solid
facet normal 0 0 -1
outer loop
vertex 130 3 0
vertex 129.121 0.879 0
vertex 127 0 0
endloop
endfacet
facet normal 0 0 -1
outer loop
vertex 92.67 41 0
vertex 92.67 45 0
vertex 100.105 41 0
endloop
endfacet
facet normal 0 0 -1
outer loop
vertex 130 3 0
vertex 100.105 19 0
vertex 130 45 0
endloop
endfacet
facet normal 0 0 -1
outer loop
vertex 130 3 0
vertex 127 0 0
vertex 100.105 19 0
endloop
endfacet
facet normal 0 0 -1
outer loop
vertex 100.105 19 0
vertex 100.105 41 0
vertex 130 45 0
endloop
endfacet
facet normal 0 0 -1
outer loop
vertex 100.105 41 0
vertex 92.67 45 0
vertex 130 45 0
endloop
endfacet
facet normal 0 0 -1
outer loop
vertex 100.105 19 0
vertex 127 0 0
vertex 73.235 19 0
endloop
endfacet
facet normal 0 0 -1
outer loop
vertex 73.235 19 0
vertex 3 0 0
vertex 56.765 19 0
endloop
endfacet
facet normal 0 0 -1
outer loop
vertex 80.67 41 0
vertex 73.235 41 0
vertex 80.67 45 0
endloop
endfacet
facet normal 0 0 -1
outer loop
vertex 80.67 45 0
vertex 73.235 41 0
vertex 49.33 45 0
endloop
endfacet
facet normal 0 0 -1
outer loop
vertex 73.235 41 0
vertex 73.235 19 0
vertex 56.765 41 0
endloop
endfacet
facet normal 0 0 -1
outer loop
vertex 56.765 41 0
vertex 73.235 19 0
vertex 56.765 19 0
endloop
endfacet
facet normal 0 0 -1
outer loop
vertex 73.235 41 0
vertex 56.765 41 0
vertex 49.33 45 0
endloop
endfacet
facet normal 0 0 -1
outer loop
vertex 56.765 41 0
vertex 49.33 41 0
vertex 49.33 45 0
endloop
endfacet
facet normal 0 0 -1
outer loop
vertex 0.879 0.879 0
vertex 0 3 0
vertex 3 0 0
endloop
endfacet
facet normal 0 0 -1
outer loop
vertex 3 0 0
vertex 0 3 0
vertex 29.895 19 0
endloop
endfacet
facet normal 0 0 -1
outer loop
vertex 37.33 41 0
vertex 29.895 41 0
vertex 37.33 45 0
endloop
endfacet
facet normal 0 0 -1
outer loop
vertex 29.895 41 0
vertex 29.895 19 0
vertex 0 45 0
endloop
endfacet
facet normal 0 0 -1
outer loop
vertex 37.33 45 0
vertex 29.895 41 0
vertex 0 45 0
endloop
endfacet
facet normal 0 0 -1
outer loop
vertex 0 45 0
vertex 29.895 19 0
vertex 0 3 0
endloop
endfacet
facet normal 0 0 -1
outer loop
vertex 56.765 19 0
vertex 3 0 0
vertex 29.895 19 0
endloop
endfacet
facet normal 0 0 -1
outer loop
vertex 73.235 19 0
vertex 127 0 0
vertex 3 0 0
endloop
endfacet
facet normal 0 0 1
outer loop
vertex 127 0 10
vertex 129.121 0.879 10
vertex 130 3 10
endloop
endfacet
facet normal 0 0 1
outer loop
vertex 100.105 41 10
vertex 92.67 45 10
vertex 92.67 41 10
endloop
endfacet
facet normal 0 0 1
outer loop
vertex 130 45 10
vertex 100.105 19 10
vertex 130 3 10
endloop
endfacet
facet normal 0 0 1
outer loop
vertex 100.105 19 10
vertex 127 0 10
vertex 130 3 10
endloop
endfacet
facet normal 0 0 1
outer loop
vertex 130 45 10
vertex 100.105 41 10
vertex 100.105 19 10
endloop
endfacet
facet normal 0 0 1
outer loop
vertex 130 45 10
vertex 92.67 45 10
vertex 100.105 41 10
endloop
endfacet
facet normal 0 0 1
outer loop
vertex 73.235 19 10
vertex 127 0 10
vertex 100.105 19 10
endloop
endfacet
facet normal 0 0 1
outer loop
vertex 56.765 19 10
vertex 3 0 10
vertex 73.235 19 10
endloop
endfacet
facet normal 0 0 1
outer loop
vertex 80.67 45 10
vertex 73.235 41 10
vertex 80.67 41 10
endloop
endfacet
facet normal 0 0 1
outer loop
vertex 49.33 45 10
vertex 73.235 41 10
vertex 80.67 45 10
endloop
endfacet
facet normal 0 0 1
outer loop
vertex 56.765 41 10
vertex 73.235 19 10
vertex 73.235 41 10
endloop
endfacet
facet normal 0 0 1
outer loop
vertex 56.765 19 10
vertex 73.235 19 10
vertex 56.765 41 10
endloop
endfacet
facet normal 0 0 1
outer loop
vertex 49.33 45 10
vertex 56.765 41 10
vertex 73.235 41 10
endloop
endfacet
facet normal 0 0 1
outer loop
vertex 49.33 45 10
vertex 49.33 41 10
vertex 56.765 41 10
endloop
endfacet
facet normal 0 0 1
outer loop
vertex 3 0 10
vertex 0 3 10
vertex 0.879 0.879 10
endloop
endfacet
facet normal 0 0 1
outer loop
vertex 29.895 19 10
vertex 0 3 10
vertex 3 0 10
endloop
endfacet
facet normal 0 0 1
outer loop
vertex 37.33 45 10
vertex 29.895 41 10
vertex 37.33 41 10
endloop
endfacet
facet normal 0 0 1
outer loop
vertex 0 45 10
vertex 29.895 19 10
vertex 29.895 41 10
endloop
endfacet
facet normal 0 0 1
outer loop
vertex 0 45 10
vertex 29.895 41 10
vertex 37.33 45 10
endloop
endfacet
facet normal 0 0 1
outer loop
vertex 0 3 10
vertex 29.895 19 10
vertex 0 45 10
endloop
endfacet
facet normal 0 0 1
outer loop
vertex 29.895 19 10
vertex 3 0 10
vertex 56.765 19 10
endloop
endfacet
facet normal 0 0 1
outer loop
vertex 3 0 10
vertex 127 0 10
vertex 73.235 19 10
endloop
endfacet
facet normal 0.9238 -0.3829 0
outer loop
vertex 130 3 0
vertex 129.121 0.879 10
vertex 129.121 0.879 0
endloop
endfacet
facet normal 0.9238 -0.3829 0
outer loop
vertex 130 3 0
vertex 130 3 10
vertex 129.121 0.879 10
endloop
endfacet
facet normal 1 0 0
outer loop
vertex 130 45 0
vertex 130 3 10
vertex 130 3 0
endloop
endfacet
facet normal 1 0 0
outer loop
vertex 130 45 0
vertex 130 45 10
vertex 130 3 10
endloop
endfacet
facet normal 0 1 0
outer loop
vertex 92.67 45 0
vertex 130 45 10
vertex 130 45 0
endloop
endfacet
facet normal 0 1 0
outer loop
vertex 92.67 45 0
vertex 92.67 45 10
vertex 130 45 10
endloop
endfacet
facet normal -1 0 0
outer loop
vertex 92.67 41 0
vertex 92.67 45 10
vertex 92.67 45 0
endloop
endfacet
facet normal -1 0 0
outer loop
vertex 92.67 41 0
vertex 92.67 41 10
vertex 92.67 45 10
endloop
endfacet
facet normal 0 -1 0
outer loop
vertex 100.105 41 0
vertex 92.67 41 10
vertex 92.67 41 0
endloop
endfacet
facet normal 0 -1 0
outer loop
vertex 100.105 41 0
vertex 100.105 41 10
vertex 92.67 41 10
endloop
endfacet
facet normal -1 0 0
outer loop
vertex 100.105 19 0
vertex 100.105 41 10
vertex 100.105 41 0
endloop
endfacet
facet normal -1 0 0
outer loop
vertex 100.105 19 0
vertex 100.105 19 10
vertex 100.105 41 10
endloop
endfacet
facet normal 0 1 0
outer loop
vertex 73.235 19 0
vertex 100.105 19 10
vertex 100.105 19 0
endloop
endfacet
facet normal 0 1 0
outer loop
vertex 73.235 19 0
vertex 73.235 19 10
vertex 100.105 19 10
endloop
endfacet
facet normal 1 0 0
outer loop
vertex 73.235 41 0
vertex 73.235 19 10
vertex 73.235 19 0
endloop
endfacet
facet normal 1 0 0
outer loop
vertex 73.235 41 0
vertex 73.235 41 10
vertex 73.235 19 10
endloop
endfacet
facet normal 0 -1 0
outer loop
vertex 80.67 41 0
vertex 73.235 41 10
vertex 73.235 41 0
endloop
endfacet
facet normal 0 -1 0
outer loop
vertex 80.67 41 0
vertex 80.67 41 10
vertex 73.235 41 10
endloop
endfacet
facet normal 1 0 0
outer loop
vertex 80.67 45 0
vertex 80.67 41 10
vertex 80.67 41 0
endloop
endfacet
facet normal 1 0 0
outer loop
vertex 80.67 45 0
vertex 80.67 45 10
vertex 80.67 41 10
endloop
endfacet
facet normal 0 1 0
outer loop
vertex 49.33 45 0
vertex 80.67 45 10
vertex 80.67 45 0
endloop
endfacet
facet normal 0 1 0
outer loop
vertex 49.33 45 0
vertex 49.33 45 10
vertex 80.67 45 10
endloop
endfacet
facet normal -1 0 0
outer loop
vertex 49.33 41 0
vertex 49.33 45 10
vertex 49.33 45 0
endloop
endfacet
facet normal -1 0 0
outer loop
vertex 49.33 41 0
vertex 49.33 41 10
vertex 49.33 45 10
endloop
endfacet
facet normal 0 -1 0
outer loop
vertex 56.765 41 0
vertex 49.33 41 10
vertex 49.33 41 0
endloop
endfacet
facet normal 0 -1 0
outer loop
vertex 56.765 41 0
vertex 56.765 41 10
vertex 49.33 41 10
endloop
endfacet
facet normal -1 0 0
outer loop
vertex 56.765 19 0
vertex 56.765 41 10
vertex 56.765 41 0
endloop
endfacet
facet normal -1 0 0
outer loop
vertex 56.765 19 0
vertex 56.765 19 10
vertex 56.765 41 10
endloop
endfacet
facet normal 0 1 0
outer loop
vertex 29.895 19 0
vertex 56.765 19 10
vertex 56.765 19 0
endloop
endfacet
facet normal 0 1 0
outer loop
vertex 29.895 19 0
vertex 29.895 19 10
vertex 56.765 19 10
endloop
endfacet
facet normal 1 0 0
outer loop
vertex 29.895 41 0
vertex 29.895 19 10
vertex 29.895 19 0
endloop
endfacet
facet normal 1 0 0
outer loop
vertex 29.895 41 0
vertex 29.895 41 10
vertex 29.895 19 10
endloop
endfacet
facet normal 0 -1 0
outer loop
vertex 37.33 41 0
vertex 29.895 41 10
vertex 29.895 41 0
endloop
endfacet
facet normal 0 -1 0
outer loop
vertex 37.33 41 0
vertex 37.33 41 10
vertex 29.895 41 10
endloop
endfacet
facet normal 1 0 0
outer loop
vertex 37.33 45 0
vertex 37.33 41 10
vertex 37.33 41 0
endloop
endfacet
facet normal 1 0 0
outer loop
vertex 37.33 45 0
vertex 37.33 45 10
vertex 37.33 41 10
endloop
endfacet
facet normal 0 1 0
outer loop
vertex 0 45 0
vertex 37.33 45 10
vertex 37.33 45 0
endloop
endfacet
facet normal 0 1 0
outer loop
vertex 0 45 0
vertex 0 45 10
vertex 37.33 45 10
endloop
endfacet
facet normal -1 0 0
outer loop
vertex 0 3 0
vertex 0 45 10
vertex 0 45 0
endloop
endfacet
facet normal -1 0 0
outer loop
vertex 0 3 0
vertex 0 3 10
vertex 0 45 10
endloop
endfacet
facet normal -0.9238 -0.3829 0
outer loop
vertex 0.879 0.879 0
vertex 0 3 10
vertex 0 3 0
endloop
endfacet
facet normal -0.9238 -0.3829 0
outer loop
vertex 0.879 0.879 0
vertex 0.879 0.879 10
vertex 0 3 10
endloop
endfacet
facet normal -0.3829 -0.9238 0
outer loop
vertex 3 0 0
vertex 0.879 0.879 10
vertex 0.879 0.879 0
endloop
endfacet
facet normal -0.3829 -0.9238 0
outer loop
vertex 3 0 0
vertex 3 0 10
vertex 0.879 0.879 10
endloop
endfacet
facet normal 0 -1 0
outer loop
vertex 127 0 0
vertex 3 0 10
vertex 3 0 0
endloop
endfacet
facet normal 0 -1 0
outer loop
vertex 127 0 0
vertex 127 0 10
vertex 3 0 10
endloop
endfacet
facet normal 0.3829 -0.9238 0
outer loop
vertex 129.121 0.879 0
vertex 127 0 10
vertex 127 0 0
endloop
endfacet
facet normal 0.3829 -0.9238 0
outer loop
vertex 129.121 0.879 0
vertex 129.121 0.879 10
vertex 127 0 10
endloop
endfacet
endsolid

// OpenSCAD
$fn = 32;

// ----------------------------------------------------------------------
// Window plate: 130 x 45 mm, 2 open windows
// ----------------------------------------------------------------------

// --- parameters (mm) ---
profile_height = 10;      // extrusion height
profile_points = 24;      // points of the closed outline

profile = [[0, 3], [0.879, 0.879], [3, 0], [127, 0], [129.121, 0.879], [130, 3], [130, 45], [92.67, 45], [92.67, 41], [100.105, 41], [100.105, 19], [73.235, 19], [73.235, 41], [80.67, 41], [80.67, 45], [49.33, 45], [49.33, 41], [56.765, 41], [56.765, 19], [29.895, 19], [29.895, 41], [37.33, 41], [37.33, 45], [0, 45]];  // single closed polygon, 24 points, counter clockwise

// --- the one profile operation ---
linear_extrude(height = profile_height) polygon(points = profile);
